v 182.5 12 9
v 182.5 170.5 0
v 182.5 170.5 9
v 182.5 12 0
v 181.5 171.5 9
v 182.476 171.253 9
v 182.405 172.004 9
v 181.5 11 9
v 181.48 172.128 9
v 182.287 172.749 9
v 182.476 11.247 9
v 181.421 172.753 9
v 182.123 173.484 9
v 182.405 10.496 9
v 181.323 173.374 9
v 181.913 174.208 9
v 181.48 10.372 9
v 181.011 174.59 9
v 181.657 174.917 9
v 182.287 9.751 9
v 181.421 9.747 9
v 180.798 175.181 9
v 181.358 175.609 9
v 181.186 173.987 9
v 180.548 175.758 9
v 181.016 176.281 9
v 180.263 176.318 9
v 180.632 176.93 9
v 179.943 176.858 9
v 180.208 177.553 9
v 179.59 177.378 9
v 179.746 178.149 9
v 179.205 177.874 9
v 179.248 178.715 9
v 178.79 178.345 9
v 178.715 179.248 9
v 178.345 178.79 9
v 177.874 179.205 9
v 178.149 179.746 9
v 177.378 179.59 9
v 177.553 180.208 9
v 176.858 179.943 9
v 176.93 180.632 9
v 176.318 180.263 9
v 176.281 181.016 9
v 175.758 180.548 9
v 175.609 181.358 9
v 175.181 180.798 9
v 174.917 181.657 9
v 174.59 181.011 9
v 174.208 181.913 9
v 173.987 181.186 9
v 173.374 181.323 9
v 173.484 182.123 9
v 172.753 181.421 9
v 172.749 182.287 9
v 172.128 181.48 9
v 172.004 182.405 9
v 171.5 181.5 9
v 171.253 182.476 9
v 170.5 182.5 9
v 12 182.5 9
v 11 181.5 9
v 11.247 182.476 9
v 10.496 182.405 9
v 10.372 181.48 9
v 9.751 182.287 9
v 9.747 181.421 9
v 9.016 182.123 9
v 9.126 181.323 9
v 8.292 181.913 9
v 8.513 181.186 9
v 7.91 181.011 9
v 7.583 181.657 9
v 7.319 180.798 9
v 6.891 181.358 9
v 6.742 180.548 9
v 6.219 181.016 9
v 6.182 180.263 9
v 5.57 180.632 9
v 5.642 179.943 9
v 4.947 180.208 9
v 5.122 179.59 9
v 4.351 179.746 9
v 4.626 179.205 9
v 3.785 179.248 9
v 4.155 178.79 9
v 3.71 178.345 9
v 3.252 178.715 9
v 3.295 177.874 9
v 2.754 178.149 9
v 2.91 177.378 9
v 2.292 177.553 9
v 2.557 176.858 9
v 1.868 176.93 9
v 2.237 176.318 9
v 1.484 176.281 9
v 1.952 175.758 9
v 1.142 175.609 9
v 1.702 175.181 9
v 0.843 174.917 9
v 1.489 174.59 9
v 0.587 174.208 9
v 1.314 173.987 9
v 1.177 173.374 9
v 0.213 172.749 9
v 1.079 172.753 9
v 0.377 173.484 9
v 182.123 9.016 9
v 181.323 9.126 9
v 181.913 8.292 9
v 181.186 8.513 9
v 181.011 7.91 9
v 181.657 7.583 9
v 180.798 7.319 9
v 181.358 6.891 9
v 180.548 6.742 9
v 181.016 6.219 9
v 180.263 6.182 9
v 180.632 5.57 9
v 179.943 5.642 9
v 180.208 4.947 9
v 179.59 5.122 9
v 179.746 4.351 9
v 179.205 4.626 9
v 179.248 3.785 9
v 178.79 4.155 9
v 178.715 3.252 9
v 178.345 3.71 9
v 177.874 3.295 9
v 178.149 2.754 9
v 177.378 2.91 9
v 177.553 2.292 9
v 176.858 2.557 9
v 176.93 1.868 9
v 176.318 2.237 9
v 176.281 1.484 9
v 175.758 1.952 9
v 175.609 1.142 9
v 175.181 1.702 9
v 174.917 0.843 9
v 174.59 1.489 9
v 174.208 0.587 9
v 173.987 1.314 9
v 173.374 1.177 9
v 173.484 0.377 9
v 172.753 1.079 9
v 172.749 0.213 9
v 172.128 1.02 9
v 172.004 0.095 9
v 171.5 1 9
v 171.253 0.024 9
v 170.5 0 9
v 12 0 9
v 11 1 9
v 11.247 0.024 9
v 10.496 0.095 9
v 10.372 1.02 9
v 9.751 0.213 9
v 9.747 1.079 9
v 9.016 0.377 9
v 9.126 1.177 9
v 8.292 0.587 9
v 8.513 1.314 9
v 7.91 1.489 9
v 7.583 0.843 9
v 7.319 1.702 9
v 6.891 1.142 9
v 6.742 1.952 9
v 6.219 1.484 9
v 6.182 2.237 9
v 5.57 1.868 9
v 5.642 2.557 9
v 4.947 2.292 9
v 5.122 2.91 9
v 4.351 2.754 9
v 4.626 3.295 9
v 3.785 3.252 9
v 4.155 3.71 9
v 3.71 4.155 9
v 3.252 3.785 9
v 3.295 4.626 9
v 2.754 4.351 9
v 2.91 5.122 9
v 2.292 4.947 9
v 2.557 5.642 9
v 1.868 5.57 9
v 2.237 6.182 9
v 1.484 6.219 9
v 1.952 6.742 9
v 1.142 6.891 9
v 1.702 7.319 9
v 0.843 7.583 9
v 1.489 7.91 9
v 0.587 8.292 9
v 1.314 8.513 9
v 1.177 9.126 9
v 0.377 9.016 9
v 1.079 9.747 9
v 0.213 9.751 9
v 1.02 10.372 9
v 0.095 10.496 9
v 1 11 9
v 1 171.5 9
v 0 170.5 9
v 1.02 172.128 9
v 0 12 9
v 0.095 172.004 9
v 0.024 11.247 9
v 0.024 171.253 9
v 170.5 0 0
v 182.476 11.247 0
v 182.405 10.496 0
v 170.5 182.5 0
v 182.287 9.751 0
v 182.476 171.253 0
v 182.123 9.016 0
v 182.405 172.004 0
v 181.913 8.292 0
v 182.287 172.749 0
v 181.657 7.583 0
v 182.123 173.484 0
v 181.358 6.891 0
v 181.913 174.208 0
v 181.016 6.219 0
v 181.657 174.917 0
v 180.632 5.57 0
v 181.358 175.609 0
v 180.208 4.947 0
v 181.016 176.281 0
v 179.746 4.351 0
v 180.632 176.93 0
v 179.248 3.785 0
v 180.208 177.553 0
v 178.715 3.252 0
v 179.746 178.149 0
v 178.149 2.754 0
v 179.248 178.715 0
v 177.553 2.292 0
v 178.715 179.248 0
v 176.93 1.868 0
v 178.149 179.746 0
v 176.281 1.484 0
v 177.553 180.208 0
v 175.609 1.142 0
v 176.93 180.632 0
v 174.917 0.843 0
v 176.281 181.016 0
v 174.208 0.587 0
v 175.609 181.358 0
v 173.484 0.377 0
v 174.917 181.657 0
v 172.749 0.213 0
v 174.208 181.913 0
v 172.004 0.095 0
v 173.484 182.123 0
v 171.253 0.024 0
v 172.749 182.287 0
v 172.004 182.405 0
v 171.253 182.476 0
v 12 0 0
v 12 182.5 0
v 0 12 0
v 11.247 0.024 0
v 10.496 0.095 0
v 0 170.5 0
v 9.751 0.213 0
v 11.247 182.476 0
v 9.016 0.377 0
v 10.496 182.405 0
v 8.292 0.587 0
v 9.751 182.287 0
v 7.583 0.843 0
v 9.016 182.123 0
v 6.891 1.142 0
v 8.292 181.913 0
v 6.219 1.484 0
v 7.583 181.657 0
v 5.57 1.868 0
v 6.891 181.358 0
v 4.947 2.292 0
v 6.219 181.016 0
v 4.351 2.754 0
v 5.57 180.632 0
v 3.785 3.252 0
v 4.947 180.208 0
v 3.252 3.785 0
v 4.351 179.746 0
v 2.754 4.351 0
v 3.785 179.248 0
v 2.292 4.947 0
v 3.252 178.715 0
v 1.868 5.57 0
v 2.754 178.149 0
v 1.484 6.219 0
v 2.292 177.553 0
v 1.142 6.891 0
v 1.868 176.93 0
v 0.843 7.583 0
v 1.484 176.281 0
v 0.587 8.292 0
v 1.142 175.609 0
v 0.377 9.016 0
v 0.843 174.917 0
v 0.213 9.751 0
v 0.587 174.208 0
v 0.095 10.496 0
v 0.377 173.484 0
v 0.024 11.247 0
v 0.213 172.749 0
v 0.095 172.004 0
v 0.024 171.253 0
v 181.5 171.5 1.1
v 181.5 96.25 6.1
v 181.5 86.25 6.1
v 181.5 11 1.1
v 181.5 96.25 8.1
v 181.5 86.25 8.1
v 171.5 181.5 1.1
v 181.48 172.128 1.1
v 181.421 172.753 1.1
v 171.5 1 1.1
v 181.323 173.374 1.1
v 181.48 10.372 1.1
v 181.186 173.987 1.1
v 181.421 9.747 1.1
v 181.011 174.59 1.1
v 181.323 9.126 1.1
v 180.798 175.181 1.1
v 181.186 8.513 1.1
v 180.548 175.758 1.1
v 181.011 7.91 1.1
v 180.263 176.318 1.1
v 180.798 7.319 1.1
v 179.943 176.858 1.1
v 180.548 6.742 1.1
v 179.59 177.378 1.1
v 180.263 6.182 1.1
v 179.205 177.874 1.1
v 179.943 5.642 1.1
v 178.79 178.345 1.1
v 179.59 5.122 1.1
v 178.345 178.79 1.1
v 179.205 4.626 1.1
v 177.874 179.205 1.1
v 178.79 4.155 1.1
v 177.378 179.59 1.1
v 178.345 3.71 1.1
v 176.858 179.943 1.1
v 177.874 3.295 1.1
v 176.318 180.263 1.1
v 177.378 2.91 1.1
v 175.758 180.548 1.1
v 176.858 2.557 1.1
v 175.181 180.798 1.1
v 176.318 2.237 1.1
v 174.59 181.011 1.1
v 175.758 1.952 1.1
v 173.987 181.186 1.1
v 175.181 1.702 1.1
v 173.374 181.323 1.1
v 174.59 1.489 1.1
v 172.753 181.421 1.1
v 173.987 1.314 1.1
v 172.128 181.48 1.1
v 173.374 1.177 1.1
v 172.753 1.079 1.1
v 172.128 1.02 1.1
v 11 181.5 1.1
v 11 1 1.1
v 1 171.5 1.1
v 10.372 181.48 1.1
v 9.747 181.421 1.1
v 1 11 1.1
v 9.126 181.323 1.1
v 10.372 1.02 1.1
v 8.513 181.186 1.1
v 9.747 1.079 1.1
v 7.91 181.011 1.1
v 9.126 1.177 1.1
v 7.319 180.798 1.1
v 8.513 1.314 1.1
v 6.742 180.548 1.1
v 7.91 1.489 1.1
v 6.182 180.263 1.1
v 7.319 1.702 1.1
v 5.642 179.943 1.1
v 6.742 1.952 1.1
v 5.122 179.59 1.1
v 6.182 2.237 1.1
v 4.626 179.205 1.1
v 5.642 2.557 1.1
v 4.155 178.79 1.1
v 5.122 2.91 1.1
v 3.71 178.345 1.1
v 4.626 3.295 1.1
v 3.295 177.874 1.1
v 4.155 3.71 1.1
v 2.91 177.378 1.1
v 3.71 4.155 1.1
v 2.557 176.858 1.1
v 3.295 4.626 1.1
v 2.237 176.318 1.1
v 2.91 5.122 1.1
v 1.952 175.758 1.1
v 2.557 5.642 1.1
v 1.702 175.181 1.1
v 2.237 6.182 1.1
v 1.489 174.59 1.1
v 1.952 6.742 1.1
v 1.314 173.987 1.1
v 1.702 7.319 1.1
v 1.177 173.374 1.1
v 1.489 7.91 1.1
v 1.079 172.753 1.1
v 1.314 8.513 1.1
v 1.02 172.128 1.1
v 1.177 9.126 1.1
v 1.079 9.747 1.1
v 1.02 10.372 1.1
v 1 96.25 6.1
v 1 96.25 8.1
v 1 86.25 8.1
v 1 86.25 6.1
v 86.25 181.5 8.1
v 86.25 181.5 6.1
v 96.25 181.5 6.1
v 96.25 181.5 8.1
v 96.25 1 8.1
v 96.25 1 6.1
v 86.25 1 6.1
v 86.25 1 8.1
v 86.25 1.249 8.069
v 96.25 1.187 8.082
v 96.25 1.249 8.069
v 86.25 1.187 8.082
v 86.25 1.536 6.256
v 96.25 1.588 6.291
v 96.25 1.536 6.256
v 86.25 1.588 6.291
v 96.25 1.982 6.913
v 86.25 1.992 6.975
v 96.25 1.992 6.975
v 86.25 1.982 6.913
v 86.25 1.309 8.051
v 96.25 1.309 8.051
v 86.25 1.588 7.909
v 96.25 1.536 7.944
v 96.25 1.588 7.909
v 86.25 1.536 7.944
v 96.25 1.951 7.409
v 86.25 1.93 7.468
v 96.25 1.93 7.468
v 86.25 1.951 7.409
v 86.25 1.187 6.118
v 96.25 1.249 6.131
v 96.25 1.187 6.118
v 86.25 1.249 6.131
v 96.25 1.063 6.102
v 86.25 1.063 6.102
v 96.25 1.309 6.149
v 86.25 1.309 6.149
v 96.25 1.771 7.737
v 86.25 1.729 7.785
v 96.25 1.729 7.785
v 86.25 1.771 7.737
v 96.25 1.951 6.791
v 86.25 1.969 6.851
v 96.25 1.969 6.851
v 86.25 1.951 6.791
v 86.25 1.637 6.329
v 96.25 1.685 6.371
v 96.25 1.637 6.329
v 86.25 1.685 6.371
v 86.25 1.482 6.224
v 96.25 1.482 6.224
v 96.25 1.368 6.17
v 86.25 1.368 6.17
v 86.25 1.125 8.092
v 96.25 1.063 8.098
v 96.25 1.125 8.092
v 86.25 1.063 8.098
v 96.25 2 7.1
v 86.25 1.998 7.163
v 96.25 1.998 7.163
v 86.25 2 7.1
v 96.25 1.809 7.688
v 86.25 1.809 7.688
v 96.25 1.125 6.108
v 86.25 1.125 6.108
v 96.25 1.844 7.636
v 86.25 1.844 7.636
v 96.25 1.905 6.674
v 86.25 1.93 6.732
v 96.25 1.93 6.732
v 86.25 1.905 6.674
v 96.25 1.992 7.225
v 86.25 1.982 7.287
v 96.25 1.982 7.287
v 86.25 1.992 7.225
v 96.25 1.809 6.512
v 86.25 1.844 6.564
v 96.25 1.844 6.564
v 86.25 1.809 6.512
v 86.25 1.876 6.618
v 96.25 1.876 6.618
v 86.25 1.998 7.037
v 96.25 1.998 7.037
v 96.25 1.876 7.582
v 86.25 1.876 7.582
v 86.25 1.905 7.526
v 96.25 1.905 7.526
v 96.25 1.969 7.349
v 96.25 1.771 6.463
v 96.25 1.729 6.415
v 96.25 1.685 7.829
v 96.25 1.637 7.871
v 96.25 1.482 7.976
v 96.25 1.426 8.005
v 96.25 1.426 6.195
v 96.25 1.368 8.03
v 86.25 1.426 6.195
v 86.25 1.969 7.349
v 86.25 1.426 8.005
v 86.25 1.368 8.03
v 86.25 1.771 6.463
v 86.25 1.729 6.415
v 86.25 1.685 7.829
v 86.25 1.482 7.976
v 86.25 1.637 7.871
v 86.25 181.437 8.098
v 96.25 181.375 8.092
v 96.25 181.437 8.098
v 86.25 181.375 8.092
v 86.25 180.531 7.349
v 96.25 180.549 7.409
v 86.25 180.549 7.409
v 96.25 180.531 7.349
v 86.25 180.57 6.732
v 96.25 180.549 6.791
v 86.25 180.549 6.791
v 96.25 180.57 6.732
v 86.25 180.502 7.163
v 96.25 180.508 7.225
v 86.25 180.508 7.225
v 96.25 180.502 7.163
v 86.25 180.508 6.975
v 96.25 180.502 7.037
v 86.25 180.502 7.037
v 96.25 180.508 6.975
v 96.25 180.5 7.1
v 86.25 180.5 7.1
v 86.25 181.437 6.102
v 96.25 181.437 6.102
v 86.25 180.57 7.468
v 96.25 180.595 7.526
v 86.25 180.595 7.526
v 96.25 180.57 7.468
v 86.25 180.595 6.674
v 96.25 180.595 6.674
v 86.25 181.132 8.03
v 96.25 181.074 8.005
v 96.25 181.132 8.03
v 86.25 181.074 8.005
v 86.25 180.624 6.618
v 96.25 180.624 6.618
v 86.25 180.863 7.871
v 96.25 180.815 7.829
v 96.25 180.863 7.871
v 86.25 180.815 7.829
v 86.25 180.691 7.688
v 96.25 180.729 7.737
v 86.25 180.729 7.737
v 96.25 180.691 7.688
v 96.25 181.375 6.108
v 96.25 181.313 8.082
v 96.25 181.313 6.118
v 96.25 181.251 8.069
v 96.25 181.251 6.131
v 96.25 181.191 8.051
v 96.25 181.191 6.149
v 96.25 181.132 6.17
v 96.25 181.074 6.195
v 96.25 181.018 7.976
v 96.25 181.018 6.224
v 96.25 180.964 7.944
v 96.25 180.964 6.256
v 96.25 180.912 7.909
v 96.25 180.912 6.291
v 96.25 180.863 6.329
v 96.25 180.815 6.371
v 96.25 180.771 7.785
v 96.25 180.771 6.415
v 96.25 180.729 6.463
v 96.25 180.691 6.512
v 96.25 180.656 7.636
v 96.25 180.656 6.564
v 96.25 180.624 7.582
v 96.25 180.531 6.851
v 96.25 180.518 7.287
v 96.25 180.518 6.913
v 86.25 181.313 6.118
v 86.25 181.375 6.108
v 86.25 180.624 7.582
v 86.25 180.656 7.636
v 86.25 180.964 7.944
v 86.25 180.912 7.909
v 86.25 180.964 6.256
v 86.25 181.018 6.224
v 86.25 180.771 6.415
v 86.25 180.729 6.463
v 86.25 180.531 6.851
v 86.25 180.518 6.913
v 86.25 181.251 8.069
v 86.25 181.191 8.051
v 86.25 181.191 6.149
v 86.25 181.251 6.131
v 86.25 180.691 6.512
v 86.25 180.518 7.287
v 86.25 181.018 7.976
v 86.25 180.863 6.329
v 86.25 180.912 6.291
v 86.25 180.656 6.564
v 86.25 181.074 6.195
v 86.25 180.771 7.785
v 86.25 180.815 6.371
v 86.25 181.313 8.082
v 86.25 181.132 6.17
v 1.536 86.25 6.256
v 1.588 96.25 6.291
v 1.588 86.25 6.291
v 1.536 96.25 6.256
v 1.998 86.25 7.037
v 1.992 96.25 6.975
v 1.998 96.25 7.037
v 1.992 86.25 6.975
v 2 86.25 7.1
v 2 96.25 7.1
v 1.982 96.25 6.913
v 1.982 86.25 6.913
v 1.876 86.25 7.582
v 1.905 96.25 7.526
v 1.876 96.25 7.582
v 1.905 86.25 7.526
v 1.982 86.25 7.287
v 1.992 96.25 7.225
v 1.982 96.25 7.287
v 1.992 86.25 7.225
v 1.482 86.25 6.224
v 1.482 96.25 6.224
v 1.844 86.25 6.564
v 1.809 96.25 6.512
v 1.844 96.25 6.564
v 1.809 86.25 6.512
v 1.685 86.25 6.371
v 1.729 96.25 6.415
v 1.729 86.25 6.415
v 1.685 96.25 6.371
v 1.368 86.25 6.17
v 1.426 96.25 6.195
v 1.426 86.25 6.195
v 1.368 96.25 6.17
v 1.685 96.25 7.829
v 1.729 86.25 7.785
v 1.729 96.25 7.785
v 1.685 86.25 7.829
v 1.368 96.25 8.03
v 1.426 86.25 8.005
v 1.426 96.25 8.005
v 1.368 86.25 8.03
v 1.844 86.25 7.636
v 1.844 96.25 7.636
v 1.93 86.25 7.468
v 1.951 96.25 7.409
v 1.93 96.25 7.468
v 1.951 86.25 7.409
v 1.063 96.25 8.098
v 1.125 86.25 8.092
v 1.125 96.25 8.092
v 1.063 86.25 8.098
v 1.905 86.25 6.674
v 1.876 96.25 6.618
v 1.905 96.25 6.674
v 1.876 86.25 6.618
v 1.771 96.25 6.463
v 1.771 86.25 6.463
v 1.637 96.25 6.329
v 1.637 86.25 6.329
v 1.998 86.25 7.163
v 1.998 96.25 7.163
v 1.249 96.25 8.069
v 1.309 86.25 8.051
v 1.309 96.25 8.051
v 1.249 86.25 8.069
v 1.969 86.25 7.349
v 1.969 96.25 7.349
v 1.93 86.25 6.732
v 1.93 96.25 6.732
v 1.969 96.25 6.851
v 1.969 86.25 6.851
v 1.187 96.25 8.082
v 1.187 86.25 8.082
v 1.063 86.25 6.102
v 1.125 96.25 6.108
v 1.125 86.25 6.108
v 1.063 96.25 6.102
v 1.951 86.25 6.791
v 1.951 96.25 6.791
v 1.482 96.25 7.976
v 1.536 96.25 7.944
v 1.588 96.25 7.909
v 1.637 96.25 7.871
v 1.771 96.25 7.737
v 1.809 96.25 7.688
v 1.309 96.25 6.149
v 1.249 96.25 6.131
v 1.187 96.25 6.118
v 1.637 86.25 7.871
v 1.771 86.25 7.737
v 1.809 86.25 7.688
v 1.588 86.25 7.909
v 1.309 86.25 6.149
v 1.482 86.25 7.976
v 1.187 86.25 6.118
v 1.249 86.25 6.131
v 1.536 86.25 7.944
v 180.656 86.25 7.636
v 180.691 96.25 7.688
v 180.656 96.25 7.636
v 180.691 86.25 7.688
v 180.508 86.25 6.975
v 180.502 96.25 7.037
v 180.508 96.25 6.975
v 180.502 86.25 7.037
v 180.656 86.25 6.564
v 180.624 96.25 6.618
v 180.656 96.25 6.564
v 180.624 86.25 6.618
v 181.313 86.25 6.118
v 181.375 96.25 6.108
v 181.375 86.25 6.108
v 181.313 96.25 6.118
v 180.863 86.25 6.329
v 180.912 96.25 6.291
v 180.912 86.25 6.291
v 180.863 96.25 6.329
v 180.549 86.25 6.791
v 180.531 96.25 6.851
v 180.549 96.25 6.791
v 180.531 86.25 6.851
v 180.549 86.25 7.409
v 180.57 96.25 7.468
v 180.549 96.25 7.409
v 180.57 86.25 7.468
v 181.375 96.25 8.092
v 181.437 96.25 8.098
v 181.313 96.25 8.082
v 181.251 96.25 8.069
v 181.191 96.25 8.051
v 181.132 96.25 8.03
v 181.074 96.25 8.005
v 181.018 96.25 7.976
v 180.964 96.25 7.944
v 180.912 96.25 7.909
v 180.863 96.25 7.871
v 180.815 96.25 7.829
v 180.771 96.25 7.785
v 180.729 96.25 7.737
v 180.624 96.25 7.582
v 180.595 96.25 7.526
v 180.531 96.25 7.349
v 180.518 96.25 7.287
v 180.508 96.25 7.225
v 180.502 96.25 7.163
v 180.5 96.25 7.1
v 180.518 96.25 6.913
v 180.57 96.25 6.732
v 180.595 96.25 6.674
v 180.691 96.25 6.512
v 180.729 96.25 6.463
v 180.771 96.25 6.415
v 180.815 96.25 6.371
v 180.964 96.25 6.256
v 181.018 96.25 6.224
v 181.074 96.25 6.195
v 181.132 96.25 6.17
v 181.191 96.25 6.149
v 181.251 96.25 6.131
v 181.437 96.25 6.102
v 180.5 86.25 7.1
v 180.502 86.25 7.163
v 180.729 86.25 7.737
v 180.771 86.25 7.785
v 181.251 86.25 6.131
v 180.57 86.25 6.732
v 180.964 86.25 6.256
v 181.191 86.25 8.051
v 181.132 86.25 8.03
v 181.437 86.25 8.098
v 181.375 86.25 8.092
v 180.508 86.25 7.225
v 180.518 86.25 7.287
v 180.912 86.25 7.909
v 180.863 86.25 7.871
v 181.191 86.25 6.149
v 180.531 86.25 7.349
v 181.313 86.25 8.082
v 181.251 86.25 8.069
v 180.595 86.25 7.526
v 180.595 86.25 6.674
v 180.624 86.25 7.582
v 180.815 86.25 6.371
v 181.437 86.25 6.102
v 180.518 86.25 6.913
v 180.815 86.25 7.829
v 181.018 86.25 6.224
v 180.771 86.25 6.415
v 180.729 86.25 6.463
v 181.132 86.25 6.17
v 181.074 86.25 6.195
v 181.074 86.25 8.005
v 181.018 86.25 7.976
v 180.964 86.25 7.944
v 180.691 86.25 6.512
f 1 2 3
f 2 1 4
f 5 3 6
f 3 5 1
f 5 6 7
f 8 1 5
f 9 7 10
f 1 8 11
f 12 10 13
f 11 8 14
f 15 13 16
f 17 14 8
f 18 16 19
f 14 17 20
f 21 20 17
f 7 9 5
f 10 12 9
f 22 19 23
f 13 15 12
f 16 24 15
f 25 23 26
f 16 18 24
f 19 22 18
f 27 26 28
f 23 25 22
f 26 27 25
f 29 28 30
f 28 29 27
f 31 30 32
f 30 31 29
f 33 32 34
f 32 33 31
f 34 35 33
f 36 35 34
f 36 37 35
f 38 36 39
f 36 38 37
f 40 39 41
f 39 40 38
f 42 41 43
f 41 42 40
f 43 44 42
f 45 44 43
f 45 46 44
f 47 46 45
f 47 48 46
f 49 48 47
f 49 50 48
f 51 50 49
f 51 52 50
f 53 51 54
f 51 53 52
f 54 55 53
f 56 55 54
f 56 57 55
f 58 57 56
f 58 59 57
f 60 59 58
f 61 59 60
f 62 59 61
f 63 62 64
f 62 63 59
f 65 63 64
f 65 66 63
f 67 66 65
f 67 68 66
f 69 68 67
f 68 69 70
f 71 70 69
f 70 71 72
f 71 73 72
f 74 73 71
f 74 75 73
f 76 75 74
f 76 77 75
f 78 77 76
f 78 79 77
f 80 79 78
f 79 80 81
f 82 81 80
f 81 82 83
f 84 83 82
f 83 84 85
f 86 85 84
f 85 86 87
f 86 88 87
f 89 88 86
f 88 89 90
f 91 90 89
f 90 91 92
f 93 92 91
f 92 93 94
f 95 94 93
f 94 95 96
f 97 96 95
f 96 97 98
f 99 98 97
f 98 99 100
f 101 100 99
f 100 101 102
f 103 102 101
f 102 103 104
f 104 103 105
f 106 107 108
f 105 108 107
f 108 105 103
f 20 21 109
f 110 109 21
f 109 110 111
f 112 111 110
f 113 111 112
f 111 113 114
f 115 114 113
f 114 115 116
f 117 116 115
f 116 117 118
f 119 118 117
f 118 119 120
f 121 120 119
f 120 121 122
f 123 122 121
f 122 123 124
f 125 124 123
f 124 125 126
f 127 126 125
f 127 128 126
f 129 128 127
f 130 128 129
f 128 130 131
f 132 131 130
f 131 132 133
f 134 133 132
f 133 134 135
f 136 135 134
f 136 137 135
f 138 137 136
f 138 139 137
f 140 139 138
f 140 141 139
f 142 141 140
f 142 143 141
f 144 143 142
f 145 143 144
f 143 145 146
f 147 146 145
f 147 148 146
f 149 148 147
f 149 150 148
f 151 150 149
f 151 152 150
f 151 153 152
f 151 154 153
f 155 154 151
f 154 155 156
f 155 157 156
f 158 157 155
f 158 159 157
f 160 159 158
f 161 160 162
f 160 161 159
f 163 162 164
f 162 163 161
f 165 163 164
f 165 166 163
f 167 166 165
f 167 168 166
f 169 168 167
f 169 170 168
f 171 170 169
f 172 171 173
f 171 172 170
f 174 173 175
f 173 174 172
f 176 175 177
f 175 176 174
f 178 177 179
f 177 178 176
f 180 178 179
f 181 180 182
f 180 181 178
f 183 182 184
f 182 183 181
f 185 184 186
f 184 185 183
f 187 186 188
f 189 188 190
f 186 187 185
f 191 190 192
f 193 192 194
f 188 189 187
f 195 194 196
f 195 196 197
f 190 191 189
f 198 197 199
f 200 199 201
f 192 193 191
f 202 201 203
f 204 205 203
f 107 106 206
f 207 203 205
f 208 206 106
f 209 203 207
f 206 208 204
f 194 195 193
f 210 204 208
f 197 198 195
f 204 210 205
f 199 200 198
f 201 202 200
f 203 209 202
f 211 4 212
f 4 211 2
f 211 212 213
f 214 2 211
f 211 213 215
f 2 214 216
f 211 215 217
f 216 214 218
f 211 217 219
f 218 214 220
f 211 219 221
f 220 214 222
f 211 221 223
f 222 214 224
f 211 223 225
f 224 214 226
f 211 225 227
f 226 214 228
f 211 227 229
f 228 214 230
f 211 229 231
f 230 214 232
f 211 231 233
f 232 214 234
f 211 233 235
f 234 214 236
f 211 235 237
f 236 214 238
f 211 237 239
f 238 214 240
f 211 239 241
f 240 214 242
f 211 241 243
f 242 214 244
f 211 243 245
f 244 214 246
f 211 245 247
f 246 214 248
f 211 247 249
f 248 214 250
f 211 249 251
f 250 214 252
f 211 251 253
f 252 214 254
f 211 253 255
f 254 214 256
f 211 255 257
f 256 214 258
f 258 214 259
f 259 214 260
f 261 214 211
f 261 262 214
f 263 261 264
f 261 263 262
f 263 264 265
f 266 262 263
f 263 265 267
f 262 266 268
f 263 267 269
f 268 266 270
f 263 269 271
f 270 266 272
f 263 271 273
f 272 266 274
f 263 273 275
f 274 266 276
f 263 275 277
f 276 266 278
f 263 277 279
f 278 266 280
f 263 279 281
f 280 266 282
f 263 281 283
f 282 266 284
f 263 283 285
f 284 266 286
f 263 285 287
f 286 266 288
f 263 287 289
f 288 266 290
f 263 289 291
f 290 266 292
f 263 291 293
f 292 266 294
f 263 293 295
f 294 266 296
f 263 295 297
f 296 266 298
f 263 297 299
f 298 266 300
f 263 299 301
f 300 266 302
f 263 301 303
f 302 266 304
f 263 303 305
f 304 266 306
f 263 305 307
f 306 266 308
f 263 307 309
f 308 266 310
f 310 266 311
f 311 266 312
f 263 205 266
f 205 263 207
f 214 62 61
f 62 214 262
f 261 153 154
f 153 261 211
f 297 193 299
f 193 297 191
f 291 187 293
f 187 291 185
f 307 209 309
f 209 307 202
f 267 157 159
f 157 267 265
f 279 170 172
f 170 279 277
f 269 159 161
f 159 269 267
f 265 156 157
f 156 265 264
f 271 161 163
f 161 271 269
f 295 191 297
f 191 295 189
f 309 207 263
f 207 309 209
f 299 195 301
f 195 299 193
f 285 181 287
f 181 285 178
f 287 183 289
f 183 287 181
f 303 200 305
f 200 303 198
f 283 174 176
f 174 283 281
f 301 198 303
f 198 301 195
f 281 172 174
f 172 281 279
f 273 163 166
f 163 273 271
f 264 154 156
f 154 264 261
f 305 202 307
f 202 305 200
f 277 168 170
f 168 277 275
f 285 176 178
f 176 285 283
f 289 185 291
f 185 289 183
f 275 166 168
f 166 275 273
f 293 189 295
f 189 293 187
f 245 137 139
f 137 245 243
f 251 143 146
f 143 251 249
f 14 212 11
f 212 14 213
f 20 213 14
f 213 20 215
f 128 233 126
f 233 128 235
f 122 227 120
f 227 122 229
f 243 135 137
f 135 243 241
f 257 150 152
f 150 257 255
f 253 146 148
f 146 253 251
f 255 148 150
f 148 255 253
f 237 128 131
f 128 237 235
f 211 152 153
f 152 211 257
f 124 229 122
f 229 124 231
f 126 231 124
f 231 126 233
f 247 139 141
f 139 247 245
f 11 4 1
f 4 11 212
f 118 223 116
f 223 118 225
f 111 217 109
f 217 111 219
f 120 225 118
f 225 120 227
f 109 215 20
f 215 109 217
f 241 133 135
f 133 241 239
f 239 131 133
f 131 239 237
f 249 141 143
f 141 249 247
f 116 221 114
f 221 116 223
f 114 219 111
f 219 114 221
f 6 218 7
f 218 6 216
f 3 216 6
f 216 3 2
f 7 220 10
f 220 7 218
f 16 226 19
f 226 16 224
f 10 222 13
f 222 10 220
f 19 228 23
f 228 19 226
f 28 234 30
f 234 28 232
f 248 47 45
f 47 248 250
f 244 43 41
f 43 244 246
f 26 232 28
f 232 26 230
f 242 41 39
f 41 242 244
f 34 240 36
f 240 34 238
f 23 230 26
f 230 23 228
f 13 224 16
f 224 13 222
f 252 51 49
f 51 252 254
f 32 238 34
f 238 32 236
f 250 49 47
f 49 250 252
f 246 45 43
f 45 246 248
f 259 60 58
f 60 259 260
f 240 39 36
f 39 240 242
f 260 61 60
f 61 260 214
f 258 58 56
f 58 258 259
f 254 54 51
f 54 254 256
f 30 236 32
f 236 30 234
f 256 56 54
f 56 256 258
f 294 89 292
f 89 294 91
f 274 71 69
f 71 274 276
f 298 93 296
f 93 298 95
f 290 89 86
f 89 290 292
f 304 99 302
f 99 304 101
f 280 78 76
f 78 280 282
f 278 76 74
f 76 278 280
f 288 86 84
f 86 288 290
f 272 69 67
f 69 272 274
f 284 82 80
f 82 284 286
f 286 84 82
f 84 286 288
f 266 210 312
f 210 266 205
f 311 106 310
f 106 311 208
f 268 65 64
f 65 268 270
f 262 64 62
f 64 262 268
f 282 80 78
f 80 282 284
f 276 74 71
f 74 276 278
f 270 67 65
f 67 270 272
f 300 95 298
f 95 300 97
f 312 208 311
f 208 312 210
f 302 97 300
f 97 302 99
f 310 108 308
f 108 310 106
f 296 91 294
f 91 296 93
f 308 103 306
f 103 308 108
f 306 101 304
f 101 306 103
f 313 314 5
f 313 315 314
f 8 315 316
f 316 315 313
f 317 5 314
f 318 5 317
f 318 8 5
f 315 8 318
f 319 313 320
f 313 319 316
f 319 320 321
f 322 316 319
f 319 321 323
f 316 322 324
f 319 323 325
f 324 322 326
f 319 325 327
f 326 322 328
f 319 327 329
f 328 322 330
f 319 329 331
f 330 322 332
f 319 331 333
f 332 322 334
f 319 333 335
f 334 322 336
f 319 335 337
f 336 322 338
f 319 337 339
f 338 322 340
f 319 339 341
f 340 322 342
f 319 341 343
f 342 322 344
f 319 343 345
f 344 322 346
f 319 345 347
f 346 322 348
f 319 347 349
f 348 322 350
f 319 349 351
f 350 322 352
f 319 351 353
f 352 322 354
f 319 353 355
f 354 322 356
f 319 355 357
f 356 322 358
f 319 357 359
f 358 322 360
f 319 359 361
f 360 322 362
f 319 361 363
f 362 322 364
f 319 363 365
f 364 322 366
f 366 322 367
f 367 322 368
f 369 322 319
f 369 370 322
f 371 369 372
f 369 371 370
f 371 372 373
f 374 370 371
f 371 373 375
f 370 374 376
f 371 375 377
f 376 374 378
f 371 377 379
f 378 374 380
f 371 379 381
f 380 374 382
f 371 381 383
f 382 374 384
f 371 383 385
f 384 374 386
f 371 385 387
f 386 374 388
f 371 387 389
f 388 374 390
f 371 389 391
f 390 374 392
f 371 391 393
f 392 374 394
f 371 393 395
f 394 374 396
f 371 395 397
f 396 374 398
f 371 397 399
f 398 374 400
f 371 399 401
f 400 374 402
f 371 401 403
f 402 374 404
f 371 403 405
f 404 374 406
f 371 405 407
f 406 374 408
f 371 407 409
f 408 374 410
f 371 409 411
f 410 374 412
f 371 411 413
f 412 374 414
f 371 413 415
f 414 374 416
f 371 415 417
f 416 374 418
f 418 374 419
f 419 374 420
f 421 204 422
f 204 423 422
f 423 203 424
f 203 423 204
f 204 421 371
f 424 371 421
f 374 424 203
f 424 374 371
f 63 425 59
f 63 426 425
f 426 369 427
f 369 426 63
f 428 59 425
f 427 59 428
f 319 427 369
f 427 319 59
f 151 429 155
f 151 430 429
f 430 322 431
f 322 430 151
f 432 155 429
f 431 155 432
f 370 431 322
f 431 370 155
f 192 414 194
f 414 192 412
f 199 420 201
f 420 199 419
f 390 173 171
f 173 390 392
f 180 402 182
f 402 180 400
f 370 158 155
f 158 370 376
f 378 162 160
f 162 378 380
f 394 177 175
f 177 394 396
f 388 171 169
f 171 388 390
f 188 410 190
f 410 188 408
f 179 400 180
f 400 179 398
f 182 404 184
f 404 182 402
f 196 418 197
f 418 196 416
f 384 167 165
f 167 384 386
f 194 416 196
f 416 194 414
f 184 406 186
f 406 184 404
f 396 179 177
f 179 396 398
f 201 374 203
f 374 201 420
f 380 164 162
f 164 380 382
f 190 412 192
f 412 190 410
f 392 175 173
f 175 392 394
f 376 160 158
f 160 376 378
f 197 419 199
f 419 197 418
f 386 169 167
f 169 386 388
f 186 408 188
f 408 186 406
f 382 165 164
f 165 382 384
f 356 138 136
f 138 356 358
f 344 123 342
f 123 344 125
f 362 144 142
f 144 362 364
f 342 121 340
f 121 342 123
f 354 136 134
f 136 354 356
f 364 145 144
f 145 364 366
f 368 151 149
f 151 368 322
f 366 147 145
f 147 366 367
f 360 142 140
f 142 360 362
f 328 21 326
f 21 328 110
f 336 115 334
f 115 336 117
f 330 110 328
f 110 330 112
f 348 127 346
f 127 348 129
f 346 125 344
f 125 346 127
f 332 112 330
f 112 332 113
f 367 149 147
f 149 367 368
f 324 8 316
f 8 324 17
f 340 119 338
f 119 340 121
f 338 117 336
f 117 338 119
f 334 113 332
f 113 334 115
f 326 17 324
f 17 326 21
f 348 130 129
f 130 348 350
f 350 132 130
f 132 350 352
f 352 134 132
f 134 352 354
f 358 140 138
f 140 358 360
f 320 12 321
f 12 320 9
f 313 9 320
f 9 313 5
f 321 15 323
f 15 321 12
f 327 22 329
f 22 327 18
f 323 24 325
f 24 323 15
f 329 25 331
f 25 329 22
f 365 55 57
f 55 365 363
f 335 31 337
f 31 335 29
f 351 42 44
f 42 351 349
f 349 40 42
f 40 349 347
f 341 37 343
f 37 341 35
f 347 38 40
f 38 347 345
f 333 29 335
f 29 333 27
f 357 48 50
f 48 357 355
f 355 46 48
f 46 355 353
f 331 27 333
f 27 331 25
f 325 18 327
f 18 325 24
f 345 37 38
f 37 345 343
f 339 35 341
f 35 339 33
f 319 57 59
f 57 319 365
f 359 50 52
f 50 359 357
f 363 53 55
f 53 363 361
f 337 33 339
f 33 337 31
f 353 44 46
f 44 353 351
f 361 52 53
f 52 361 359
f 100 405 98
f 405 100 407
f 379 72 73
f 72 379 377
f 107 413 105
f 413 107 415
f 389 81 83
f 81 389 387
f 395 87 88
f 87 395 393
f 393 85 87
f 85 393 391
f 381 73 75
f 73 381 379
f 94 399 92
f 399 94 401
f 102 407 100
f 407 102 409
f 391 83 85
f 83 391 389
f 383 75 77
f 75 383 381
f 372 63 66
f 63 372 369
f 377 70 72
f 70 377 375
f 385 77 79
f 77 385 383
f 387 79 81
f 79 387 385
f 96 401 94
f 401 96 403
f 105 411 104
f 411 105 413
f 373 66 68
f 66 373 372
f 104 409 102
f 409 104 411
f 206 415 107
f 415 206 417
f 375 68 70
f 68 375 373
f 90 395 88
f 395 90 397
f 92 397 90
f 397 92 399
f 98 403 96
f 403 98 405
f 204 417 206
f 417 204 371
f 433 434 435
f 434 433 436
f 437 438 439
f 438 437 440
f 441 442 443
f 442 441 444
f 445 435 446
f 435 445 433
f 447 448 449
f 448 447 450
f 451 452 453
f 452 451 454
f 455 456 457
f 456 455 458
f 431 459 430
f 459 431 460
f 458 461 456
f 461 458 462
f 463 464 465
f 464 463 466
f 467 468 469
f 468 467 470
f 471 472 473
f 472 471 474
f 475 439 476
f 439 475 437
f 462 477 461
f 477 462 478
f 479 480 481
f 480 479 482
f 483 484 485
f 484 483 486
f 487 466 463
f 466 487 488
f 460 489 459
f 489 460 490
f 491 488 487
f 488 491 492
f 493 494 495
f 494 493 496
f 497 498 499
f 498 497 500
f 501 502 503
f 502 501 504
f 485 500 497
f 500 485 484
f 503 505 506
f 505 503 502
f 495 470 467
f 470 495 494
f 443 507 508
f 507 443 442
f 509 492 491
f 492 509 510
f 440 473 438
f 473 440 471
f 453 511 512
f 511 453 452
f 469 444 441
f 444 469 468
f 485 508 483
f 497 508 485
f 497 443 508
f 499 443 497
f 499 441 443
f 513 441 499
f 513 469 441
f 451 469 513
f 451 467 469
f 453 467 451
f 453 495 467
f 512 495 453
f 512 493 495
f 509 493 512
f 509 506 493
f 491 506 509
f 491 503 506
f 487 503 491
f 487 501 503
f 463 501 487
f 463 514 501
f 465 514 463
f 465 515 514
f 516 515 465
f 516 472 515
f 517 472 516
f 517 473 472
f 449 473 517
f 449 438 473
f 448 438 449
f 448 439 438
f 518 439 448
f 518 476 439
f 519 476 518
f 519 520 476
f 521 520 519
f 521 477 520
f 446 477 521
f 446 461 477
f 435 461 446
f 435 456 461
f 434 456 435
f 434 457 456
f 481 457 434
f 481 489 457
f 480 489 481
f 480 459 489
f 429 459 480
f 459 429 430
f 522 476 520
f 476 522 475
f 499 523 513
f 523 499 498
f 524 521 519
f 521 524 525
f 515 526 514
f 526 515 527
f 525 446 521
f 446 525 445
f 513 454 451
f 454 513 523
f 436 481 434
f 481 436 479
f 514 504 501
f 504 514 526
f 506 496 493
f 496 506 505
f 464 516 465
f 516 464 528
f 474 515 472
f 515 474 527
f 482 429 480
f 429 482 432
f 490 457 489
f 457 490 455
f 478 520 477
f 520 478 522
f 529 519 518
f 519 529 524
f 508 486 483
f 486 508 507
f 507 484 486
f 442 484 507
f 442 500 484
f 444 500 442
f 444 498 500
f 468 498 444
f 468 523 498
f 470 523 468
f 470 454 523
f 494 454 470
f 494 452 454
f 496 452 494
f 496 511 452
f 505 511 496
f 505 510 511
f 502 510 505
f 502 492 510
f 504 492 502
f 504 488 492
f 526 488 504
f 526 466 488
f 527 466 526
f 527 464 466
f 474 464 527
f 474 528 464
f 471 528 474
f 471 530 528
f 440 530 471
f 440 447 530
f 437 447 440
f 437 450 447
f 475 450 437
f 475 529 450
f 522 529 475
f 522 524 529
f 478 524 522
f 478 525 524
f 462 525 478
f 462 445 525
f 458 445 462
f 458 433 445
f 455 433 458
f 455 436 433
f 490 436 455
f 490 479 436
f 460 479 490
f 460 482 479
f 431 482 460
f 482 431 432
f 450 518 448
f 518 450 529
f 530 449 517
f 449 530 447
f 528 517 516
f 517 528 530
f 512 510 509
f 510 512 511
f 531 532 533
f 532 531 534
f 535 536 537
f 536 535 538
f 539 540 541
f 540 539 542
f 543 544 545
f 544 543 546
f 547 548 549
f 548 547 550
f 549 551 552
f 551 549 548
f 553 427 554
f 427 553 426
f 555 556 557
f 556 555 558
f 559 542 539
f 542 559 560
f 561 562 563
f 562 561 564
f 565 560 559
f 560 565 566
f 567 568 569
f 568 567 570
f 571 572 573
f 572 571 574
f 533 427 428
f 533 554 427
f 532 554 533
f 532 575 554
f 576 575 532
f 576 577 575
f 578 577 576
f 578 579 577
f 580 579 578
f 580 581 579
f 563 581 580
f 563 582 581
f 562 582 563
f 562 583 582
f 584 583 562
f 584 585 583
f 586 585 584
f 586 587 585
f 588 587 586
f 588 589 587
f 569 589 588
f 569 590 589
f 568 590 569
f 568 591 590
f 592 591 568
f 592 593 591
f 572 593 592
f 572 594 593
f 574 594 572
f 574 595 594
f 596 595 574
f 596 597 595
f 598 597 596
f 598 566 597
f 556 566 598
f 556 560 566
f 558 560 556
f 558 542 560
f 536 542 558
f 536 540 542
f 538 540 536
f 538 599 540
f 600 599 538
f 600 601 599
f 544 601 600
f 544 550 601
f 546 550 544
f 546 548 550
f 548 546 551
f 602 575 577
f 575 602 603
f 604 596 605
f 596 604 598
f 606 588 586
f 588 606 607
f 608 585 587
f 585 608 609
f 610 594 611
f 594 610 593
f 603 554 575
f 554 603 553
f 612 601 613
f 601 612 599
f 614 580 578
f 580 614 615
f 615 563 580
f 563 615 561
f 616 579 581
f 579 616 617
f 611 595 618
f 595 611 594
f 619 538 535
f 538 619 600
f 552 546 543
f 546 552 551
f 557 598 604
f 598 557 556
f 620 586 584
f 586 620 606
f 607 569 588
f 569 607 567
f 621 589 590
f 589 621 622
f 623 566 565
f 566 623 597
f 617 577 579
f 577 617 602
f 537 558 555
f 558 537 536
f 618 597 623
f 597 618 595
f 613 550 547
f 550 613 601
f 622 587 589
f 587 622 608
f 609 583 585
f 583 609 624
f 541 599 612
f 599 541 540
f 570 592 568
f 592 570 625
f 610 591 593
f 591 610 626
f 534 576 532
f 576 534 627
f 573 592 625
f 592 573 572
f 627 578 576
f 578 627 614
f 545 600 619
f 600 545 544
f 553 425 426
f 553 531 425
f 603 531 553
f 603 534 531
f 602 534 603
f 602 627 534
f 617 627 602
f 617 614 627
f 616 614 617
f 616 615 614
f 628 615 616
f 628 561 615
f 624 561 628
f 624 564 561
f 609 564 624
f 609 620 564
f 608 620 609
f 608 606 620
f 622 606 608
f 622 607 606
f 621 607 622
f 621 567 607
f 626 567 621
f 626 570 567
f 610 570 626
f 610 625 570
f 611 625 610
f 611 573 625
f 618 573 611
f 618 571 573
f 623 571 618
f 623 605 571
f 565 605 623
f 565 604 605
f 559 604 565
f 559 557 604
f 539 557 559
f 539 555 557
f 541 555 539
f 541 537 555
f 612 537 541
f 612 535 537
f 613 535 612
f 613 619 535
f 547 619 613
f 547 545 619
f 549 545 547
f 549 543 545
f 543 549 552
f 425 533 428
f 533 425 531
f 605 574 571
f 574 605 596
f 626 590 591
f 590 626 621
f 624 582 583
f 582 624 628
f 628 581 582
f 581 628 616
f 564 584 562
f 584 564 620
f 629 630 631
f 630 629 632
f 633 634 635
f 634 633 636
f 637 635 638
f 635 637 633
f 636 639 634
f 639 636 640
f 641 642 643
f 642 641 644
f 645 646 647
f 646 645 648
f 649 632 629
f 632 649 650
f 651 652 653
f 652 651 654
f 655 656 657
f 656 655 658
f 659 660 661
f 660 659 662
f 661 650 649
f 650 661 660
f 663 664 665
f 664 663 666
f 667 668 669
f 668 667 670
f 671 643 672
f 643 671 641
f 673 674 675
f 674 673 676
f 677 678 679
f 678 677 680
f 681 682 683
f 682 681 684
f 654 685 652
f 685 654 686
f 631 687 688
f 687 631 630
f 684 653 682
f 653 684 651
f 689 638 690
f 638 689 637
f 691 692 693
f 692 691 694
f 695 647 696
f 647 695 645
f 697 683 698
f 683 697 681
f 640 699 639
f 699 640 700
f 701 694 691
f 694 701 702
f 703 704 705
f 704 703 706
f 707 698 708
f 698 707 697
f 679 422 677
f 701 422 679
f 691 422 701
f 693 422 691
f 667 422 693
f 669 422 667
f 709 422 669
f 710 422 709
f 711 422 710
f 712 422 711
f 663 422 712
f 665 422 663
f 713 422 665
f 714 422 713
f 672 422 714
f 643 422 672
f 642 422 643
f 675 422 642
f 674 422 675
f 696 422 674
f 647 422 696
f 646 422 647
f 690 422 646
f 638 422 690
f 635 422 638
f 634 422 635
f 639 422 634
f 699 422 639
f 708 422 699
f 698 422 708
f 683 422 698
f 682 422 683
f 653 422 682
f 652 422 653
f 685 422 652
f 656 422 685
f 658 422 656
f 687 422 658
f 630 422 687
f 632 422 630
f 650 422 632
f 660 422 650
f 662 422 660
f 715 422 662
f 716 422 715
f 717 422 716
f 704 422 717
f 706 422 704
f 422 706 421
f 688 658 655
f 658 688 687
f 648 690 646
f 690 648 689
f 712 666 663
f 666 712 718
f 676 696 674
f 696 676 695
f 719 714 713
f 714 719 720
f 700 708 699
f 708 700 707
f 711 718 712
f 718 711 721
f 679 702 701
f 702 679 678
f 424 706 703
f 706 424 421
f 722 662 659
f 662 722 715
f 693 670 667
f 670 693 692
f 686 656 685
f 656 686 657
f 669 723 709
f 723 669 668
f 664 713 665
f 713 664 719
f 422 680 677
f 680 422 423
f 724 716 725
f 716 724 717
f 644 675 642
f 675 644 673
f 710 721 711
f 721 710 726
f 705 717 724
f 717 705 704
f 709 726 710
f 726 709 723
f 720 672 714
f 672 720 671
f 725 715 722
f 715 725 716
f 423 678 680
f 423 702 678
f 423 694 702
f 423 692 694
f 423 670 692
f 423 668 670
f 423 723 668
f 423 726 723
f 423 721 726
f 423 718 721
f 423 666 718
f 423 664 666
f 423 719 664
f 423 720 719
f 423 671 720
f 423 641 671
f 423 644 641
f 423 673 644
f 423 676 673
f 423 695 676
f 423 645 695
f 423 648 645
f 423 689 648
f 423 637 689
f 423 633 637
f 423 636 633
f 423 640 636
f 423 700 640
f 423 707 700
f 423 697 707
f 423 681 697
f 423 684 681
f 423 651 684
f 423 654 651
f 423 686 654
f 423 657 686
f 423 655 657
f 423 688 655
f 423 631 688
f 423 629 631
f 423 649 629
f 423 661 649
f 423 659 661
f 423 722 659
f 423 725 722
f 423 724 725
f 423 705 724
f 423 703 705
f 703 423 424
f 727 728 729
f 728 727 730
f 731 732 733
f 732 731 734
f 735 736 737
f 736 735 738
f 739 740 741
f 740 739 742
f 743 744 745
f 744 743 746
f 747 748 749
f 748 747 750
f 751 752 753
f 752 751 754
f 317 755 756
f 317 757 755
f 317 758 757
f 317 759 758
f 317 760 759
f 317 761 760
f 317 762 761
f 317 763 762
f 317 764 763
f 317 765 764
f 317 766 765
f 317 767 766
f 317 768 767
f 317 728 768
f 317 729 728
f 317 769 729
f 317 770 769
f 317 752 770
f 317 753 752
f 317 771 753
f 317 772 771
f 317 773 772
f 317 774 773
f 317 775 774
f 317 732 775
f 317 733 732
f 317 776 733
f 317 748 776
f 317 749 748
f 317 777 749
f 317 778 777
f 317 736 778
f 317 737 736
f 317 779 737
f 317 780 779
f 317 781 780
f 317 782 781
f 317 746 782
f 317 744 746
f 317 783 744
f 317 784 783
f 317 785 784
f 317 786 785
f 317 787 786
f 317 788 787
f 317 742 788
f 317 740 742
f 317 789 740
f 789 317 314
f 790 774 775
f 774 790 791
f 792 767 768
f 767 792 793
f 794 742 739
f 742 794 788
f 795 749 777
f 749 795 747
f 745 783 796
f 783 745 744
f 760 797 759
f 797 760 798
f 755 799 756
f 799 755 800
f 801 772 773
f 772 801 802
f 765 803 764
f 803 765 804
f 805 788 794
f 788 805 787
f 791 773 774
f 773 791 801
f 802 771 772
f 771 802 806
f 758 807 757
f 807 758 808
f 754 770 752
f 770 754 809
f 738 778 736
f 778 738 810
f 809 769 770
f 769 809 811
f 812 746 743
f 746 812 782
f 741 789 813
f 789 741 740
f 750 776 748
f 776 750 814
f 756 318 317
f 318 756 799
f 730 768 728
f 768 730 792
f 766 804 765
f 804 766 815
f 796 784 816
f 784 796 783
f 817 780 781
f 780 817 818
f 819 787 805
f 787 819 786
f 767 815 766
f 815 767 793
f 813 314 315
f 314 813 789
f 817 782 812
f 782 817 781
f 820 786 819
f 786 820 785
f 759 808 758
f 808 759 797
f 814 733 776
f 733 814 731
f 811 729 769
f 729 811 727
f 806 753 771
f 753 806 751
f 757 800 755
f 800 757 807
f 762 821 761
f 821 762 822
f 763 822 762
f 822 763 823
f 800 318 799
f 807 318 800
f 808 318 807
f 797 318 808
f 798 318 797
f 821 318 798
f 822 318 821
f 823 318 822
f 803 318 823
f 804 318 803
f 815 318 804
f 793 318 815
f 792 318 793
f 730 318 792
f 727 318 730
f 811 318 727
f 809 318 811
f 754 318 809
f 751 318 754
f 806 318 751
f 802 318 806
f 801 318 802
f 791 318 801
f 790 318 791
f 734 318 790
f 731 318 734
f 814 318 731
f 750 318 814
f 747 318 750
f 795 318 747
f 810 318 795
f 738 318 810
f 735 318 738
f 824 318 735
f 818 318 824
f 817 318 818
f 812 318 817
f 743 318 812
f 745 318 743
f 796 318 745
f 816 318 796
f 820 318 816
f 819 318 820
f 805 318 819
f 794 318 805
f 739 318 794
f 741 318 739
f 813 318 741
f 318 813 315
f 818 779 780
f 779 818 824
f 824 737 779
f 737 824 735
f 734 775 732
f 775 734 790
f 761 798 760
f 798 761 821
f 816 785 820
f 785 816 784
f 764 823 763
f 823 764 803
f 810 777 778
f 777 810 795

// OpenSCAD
side=180.5;
corner=10;
pegd=1;
thick=2;
side2=side+thick;
corner2=corner+thick;
height=9;
hh=1.1;
$fn=100;

intersection()
{
	union()
	{
		difference()
		{
			union()
			{
				difference()
				{
					cube([side2, side2, height]);
					cube([corner2, corner2, height]);
					translate([side2-corner2, 0, 0]) cube([corner2, corner2, height]);
					translate([side2-corner2, side2-corner2, 0]) cube([corner2, corner2, height]);
					translate([0, side2-corner2, 0]) cube([corner2, corner2, height]);
				}
				translate([corner2, corner2, 0]) cylinder(r=corner2, h=height);
				translate([side2-corner2, corner2, 0]) cylinder(r=corner2, h=height);
				translate([side2-corner2, side2-corner2, 0]) cylinder(r=corner2, h=height);
				translate([corner2, side2-corner2, 0]) cylinder(r=corner2, h=height);
			}
			translate([thick/2, thick/2, hh]) union()
			{
				difference()
				{
					cube([side, side, height]);
					cube([corner, corner, height]);
					translate([side-corner, 0, 0]) cube([corner, corner, height]);
					translate([side-corner, side-corner, 0]) cube([corner, corner, height]);
					translate([0, side-corner, 0]) cube([corner, corner, height]);
				}
				translate([corner, corner, 0]) cylinder(r=corner, h=height);
				translate([side-corner, corner, 0]) cylinder(r=corner, h=height);
				translate([side-corner, side-corner, 0]) cylinder(r=corner, h=height);
				translate([corner, side-corner, 0]) cylinder(r=corner, h=height);
			}
		}

		translate([thick/2, thick/2, 0])
		{
			translate([side/2-5, 0, hh+6]) rotate([0, 90, 0]) cylinder(h=10, r=pegd);
			translate([side/2-5, side, hh+6]) rotate([0, 90, 0]) cylinder(h=10, r=pegd);
			translate([0, side/2-5, hh+6]) rotate([-90, 0, 0]) cylinder(h=10, r=pegd);
			translate([side, side/2-5, hh+6]) rotate([-90, 0, 0]) cylinder(h=10, r=pegd);
		}
	}
	cube([side2, side2, height]);
}
